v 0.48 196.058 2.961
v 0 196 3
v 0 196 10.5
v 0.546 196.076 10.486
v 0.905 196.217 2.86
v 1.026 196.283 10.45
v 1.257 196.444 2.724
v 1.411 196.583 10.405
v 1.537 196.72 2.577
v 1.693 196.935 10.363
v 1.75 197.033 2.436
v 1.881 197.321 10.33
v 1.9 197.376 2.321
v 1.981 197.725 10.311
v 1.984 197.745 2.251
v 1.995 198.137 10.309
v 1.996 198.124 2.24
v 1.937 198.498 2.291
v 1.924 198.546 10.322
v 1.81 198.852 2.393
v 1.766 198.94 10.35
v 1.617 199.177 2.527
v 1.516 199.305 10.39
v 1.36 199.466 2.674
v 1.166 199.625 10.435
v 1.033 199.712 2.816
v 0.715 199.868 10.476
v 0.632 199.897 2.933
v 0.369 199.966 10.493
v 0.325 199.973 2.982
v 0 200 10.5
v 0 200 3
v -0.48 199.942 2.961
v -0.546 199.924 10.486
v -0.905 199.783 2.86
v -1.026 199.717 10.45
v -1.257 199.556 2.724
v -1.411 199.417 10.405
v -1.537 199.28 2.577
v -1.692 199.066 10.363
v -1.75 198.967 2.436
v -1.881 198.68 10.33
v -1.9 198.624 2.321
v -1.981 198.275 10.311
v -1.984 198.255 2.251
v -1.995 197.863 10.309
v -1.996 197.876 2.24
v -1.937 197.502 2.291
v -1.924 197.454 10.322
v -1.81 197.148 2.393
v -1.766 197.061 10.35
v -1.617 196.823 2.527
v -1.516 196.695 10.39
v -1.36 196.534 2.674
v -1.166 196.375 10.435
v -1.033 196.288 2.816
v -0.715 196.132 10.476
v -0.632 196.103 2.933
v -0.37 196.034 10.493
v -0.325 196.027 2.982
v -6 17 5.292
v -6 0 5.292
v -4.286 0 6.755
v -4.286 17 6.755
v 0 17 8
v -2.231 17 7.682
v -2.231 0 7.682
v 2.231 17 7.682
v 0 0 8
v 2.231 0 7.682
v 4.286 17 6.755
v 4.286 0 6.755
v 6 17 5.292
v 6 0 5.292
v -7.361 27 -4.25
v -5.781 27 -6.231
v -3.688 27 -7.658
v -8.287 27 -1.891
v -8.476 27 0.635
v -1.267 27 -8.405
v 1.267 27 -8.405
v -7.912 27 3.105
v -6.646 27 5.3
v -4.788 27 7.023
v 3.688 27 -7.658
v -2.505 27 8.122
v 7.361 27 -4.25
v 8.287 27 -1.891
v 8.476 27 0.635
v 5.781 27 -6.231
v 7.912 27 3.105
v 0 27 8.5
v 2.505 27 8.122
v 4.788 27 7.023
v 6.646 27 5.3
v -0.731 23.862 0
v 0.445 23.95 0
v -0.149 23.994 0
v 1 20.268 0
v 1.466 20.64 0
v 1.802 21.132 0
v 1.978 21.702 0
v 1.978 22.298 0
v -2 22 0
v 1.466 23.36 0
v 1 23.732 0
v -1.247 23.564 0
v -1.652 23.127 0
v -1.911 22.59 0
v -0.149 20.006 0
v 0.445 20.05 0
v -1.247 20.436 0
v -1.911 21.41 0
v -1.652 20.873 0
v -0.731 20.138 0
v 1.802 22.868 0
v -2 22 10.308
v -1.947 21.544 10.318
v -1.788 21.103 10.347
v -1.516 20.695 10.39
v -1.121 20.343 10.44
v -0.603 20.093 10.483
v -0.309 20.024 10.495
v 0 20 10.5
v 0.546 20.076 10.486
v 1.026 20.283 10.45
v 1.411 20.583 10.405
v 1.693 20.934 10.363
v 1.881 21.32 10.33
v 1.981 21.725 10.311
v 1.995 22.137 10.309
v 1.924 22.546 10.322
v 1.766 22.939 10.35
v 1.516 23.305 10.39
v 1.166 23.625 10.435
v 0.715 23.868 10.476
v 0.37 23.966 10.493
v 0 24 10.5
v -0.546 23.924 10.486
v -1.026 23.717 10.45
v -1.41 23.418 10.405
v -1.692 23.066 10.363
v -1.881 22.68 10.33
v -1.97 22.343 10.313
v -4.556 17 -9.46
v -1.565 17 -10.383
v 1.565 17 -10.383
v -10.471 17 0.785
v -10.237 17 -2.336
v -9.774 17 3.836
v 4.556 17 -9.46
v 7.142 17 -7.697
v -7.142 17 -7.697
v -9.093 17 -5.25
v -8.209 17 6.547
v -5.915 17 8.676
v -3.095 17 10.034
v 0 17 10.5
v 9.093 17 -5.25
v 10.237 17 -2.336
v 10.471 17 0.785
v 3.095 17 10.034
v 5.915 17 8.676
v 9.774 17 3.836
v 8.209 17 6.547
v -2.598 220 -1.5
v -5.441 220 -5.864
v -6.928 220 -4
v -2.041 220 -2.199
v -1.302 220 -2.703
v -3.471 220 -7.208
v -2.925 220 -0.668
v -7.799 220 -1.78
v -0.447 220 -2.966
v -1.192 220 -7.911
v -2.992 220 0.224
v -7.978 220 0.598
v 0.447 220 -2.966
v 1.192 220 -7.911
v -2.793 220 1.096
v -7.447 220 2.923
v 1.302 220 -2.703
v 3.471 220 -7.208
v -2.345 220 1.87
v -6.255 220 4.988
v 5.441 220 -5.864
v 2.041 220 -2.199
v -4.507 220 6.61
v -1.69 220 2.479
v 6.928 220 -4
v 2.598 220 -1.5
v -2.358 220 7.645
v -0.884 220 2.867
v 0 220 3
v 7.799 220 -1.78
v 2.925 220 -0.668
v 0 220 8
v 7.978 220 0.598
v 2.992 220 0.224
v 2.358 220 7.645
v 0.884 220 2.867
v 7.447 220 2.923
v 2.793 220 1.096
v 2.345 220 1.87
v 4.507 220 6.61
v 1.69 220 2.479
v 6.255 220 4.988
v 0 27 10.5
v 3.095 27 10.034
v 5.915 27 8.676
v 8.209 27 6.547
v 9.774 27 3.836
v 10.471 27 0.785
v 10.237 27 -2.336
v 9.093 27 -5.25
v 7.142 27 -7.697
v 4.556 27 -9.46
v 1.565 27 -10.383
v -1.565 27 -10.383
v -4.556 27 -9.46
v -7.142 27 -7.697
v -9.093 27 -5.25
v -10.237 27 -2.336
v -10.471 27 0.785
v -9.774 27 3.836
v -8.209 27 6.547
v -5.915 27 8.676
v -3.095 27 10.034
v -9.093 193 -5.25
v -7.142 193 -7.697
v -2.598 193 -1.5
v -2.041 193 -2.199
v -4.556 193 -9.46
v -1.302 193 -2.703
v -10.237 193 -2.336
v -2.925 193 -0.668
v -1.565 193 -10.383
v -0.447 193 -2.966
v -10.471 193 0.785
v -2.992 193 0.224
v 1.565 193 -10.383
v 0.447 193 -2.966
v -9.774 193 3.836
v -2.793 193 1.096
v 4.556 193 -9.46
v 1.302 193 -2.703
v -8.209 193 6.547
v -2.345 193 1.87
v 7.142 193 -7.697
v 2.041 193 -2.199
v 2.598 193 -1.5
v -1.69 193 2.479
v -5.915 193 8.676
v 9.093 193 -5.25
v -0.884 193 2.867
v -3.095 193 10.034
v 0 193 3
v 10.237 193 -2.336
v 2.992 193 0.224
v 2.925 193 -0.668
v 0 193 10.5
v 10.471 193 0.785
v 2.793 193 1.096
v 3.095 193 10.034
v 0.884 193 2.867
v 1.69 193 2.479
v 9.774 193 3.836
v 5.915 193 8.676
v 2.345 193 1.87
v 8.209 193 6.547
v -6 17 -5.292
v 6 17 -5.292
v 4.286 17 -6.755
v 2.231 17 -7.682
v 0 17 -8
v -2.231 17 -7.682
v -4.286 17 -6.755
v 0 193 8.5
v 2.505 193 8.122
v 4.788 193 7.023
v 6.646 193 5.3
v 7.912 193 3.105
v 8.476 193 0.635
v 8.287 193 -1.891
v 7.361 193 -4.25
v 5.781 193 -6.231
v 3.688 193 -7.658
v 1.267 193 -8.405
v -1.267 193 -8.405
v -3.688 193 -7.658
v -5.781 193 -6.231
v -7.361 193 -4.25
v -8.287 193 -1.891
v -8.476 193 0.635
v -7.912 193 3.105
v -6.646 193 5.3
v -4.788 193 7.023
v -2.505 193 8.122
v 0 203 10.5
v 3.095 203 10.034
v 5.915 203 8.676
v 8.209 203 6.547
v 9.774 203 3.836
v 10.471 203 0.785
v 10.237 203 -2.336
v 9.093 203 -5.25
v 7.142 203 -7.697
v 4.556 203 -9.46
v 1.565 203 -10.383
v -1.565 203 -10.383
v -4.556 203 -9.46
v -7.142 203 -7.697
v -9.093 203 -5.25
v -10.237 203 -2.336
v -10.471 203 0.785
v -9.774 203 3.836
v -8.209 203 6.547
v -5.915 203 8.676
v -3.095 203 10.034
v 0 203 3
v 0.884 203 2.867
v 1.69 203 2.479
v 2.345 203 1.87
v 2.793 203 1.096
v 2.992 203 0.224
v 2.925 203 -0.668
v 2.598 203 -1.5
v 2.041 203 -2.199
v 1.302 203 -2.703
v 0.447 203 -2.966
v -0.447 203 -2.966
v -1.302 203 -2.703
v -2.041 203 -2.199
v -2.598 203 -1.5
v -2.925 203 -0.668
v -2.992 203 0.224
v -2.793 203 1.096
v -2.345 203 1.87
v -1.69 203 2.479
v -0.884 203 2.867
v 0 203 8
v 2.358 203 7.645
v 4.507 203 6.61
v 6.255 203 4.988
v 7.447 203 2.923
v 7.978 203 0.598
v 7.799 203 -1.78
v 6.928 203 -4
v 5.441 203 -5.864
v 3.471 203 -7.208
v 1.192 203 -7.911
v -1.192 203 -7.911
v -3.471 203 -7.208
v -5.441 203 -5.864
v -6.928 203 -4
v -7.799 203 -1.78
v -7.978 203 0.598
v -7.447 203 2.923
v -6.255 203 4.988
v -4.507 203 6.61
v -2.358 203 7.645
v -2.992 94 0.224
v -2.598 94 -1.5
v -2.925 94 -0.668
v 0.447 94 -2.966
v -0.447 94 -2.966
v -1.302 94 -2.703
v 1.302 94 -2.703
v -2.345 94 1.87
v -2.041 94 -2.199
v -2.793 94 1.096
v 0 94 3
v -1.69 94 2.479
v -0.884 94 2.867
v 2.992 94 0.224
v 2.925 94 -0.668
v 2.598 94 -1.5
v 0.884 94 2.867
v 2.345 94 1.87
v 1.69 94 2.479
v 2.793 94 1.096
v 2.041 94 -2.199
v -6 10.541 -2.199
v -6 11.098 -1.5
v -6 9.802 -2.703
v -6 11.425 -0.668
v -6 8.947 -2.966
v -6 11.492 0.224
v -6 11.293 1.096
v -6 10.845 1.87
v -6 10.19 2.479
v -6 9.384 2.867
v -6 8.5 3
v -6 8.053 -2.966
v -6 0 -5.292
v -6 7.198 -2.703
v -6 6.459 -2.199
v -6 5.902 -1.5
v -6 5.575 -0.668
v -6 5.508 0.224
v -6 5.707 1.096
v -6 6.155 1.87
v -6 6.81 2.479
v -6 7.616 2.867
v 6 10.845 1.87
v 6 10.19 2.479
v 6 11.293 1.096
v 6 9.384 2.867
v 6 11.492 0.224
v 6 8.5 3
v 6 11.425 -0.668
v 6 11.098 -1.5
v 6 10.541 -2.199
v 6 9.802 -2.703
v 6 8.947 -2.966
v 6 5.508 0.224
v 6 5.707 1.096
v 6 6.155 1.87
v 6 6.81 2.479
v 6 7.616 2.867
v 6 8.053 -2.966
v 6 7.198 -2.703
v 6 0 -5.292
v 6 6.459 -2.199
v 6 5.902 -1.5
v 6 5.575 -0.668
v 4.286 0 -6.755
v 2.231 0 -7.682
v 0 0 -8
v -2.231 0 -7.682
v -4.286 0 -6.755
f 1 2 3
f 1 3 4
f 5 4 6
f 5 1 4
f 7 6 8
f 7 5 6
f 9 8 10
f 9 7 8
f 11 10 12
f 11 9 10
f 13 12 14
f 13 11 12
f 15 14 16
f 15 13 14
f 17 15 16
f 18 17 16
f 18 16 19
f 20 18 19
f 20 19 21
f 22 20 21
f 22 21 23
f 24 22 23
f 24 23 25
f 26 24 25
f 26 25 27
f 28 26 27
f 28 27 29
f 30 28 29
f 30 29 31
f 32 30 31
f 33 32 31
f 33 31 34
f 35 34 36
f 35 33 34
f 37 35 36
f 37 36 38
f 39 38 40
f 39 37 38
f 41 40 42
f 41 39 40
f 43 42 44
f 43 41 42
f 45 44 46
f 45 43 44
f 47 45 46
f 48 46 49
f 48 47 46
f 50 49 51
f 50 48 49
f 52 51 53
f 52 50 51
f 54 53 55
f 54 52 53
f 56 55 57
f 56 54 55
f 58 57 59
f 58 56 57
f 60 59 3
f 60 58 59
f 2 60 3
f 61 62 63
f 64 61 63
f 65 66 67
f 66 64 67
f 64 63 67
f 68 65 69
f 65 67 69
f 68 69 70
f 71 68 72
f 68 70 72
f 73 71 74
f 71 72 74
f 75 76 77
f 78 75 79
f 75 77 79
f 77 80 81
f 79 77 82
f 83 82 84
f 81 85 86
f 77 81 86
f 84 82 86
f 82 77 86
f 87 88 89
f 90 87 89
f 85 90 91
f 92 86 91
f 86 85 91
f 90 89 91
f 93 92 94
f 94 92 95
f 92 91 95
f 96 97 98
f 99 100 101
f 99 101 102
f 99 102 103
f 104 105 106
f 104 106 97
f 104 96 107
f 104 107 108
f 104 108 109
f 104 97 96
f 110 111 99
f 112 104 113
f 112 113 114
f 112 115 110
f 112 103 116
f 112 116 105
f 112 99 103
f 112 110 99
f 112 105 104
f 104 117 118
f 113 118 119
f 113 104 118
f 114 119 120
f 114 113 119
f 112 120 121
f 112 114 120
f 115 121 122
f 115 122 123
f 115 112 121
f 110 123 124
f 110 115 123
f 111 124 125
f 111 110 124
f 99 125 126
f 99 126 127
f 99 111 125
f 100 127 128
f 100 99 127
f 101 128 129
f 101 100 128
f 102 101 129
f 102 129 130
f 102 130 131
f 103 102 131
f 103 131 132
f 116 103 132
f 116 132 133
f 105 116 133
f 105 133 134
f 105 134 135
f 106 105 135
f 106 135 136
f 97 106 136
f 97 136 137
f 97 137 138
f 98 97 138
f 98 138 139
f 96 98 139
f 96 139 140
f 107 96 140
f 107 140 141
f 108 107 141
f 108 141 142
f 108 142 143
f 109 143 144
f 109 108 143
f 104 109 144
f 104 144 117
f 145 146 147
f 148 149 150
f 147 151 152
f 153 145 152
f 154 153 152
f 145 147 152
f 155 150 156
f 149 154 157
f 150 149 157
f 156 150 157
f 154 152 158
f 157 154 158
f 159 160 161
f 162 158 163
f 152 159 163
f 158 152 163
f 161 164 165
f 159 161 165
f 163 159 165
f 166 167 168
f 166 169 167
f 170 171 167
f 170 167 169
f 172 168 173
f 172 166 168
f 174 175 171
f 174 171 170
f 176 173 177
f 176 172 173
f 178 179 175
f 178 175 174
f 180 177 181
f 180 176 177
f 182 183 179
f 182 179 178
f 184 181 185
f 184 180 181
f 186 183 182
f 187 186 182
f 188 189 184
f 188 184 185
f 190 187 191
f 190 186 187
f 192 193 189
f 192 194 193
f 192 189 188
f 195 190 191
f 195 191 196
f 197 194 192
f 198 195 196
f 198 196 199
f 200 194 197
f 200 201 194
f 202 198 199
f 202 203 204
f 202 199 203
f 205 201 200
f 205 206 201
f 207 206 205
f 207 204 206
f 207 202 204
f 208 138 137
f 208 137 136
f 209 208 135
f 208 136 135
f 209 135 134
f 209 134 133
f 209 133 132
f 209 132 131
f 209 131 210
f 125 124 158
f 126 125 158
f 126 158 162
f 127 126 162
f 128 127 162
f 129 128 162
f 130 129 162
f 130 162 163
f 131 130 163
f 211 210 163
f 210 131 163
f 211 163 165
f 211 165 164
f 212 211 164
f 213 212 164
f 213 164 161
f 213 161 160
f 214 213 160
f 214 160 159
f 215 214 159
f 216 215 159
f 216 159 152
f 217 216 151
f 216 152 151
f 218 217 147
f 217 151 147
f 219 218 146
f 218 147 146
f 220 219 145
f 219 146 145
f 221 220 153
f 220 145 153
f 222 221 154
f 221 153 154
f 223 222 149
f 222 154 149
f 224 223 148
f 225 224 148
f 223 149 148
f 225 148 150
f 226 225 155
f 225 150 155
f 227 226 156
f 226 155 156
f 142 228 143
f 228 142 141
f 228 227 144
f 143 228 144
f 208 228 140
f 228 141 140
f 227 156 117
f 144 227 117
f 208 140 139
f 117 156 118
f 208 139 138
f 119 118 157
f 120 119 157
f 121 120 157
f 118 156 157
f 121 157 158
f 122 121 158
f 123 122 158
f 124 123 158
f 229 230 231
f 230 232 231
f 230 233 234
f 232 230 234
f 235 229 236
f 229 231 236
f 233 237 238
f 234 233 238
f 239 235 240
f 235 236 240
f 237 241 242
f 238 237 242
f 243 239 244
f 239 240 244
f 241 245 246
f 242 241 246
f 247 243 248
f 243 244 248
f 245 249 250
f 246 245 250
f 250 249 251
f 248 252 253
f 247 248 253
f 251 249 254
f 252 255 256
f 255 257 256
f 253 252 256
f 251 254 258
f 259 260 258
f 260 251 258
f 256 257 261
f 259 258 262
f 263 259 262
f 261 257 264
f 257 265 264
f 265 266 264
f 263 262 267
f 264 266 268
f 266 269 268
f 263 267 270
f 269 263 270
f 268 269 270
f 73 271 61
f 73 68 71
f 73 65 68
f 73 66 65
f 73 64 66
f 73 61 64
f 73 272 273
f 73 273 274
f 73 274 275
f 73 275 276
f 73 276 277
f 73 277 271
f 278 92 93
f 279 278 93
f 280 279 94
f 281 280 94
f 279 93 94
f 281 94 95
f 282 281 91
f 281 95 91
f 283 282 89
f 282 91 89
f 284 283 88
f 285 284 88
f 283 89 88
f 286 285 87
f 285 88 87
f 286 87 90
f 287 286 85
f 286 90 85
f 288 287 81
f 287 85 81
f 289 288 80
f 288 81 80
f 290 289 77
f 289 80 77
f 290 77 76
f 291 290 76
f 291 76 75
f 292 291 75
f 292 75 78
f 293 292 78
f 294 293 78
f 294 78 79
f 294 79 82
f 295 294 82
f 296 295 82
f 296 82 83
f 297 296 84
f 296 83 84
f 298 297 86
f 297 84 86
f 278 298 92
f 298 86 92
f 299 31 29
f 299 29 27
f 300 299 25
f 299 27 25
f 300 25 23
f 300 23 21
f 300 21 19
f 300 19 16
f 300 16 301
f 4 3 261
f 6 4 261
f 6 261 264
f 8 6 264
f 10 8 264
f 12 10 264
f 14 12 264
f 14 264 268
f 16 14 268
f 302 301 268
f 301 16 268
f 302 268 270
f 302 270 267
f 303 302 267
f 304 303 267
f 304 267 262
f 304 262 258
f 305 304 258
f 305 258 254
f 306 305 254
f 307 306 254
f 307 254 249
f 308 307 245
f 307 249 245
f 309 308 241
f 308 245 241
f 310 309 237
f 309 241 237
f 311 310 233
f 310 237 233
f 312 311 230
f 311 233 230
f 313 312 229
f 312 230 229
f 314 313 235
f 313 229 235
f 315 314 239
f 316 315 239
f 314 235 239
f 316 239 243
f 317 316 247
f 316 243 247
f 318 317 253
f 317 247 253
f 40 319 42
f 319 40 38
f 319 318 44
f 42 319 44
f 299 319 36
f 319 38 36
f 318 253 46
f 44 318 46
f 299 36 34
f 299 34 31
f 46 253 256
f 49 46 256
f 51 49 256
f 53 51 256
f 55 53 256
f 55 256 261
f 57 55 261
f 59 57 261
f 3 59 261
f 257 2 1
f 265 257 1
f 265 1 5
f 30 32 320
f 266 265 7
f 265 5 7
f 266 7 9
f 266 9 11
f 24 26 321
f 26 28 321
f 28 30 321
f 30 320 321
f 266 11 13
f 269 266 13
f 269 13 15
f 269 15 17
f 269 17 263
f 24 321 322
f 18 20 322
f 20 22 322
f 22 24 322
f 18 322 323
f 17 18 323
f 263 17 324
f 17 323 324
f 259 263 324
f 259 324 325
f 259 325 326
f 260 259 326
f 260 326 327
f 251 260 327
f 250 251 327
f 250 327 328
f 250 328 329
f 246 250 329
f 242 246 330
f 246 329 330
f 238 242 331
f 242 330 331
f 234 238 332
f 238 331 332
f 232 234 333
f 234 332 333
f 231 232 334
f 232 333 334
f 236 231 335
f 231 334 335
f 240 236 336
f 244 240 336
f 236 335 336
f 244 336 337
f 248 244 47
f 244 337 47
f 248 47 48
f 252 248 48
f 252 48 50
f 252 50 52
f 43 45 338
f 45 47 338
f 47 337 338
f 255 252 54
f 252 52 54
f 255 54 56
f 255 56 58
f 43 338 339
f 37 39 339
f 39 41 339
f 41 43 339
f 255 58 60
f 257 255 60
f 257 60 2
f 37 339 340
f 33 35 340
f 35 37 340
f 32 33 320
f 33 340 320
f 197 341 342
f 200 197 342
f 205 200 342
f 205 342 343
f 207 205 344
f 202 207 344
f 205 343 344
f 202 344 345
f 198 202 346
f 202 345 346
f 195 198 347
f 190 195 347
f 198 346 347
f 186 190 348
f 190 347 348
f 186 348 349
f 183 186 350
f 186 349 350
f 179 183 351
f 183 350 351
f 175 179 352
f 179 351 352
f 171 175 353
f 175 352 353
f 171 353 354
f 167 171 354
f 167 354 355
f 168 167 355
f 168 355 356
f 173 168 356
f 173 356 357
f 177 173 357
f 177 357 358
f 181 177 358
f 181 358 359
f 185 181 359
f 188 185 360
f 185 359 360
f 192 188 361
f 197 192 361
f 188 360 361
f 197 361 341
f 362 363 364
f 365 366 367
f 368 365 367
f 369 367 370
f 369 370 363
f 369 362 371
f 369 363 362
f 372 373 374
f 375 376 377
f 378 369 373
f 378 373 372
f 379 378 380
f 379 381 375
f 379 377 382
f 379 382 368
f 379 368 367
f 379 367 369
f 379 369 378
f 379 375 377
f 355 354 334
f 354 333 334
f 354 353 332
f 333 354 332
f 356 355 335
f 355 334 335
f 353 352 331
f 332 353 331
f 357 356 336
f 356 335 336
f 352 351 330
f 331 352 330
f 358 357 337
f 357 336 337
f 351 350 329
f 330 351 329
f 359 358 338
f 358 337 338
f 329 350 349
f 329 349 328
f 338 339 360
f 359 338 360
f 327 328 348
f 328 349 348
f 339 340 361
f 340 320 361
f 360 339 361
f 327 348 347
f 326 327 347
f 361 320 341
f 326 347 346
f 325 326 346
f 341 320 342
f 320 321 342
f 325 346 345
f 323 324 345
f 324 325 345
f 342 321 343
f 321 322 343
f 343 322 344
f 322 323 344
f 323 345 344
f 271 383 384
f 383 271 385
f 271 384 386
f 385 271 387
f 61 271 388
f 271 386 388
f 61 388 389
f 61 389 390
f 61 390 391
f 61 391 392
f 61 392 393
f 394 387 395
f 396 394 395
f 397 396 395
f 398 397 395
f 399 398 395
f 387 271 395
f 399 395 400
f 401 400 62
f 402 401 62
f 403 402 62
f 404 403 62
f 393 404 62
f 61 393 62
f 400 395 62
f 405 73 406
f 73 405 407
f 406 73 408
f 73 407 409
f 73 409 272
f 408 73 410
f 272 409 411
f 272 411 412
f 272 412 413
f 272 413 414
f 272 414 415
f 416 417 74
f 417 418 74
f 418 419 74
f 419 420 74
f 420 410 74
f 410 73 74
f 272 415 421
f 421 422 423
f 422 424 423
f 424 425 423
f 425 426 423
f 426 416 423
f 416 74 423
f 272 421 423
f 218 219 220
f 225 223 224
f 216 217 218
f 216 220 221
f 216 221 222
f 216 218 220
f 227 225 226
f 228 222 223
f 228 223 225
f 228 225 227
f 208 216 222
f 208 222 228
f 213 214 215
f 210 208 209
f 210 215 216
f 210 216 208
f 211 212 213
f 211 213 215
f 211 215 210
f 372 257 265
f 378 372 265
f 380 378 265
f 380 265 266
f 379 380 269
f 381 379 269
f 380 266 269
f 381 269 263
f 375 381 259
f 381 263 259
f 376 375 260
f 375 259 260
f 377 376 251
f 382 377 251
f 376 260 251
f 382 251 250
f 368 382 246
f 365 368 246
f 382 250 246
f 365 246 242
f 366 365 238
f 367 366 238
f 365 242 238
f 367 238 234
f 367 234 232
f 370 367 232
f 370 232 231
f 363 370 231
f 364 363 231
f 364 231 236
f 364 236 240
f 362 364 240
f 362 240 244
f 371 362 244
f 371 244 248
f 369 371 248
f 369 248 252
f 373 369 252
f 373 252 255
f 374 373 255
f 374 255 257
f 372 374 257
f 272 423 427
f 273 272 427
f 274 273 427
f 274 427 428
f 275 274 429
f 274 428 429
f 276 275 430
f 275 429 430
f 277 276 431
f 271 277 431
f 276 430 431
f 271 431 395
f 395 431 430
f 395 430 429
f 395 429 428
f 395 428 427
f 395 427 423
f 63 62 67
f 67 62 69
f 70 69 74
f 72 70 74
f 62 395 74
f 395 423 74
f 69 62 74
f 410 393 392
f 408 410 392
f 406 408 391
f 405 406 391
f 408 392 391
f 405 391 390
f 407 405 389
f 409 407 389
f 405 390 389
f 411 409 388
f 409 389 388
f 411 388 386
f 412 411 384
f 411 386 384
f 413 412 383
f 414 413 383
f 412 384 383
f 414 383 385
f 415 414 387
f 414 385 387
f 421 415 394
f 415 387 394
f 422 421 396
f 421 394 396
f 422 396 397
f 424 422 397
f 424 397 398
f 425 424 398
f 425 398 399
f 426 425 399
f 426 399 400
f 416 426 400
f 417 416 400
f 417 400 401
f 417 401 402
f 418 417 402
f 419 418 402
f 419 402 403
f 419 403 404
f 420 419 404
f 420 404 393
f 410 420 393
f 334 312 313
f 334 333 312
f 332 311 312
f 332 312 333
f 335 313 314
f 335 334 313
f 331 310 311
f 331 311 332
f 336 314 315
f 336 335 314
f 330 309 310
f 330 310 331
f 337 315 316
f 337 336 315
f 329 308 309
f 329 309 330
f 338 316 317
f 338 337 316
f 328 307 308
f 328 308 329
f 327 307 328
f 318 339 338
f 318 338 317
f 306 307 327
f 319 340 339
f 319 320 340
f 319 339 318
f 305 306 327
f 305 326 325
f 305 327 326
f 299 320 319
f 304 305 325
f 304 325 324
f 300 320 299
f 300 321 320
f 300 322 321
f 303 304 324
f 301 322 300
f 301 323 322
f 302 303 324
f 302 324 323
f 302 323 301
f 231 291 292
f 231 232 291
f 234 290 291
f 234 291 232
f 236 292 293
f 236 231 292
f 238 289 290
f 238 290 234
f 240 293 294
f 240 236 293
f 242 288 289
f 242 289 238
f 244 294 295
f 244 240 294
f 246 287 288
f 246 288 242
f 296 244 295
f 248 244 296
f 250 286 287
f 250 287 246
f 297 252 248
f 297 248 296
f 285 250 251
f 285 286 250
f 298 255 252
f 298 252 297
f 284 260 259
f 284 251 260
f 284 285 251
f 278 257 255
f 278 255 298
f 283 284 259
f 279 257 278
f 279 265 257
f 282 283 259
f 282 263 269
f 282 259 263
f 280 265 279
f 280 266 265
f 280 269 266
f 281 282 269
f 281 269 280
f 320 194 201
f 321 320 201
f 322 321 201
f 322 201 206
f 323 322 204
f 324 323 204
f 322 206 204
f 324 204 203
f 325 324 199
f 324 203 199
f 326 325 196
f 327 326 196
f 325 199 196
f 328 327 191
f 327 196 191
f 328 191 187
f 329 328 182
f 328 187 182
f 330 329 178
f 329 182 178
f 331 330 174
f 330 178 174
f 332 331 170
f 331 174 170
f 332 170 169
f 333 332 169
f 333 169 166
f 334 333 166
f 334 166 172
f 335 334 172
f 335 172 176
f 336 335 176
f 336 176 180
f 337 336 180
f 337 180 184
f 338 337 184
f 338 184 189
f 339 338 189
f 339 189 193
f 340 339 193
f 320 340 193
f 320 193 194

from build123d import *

# Parameters (mm, degrees)
SKETCH1_R           = 8
BOSS_EXTRUDE1_DEPTH = 17
SKETCH3_R           = 10.5
BOSS_EXTRUDE2_DEPTH = 10
SKETCH4_R           = 8.5
BOSS_EXTRUDE3_DEPTH = 166
SKETCH5_R           = 10.5
BOSS_EXTRUDE4_DEPTH = 10
SKETCH6_R           = 8
BOSS_EXTRUDE5_DEPTH = 17
CUT_EXTRUDE2_DEPTH  = 17
SKETCH8_R           = 3
CUT_EXTRUDE3_DEPTH  = 221.867607403
SKETCH9_R           = 3
CUT_EXTRUDE4_DEPTH  = 126
SKETCH10_R          = 2
CUT_EXTRUDE5_DEPTH  = 11


with BuildPart() as part:
    # Sketch1 → Boss-Extrude1 (new body)
    with BuildSketch(Plane(origin=(0, 0, 0), x_dir=(1, 0, 0), z_dir=(0, 1, 0))):
        with Locations(Location((0, 0, 0), (0, 0, 270))):
            Circle(SKETCH1_R)
    extrude(amount=BOSS_EXTRUDE1_DEPTH)

    # Sketch7 → Cut-Extrude2 (cut)
    with BuildSketch(Plane.XZ):
        with BuildLine():
            ThreePointArc((-6, 5.291502622), (-8, 0), (-6, -5.291502622))
            Line((-6, -5.291502622), (-6, 5.291502622))
        make_face()
        with BuildLine():
            Line((6, 5.291502622), (6, -5.291502622))
            ThreePointArc((6, -5.291502622), (7.483314774, -2.828427125), (8, 0))
            ThreePointArc((8, 0), (7.483314774, 2.828427125), (6, 5.291502622))
        make_face()
    extrude(amount=-CUT_EXTRUDE2_DEPTH, mode=Mode.SUBTRACT)

    # Sketch8 → Cut-Extrude3 (cut, through all)
    with BuildSketch(Plane.ZY.offset(6)):
        with Locations((0, 8.5)):
            Circle(SKETCH8_R)
    extrude(amount=-CUT_EXTRUDE3_DEPTH, mode=Mode.SUBTRACT)


with BuildPart() as body_2:
    # Sketch3 → Boss-Extrude2 (new body)
    with BuildSketch(Plane(origin=(0, 17, 0), x_dir=(1, 0, 0), z_dir=(0, 1, 0))):
        with Locations(Location((0, 0, 0), (0, 0, 270))):
            Circle(SKETCH3_R)
    extrude(amount=BOSS_EXTRUDE2_DEPTH)


with BuildPart() as body_3:
    # Sketch4 → Boss-Extrude3 (new body)
    with BuildSketch(Plane(origin=(0, 27, 0), x_dir=(1, 0, 0), z_dir=(0, 1, 0))):
        with Locations(Location((0, 0, 0), (0, 0, 270))):
            Circle(SKETCH4_R)
    extrude(amount=BOSS_EXTRUDE3_DEPTH)


with BuildPart() as body_4:
    # Sketch5 → Boss-Extrude4 (new body)
    with BuildSketch(Plane(origin=(0, 193, 0), x_dir=(1, 0, 0), z_dir=(0, 1, 0))):
        with Locations(Location((0, 0, 0), (0, 0, 270))):
            Circle(SKETCH5_R)
    extrude(amount=BOSS_EXTRUDE4_DEPTH)


with BuildPart() as body_5:
    # Sketch6 → Boss-Extrude5 (new body)
    with BuildSketch(Plane(origin=(0, 203, 0), x_dir=(1, 0, 0), z_dir=(0, 1, 0))):
        with Locations(Location((0, 0, 0), (0, 0, 270))):
            Circle(SKETCH6_R)
    extrude(amount=BOSS_EXTRUDE5_DEPTH)


with BuildPart() as cut_extrude4_tool:
    # Sketch9 → Cut-Extrude4 (new body)
    with BuildSketch(Plane(origin=(0, 220, 0), x_dir=(1, 0, 0), z_dir=(0, 1, 0))):
        with Locations(Location((0, 0, 0), (0, 0, 270))):
            Circle(SKETCH9_R)
    extrude(amount=-CUT_EXTRUDE4_DEPTH)


with BuildPart() as body_3_1:
    add(body_3.part)

    # Cut-Extrude4: cut by cut_extrude4_tool
    add(cut_extrude4_tool.part, mode=Mode.SUBTRACT)


with BuildPart() as body_4_1:
    add(body_4.part)

    # Cut-Extrude4: cut by cut_extrude4_tool
    add(cut_extrude4_tool.part, mode=Mode.SUBTRACT)


with BuildPart() as body_5_1:
    add(body_5.part)

    # Cut-Extrude4: cut by cut_extrude4_tool
    add(cut_extrude4_tool.part, mode=Mode.SUBTRACT)


with BuildPart() as cut_extrude5_tool:
    # Sketch10 → Cut-Extrude5 (new body)
    with BuildSketch(Plane.XY):
        with Locations(Location((0, 198, 0), (0, 0, 270))):
            Circle(SKETCH10_R)
        with Locations(Location((0, 22, 0), (0, 0, 180))):
            Circle(SKETCH10_R)
    extrude(amount=CUT_EXTRUDE5_DEPTH)


with BuildPart() as body_2_1:
    add(body_2.part)

    # Cut-Extrude5: cut by cut_extrude5_tool
    add(cut_extrude5_tool.part, mode=Mode.SUBTRACT)


with BuildPart() as body_4_2:
    add(body_4_1.part)

    # Cut-Extrude5: cut by cut_extrude5_tool
    add(cut_extrude5_tool.part, mode=Mode.SUBTRACT)


solid = Compound([part.part, body_3_1.part, body_5_1.part, body_2_1.part, body_4_2.part])
